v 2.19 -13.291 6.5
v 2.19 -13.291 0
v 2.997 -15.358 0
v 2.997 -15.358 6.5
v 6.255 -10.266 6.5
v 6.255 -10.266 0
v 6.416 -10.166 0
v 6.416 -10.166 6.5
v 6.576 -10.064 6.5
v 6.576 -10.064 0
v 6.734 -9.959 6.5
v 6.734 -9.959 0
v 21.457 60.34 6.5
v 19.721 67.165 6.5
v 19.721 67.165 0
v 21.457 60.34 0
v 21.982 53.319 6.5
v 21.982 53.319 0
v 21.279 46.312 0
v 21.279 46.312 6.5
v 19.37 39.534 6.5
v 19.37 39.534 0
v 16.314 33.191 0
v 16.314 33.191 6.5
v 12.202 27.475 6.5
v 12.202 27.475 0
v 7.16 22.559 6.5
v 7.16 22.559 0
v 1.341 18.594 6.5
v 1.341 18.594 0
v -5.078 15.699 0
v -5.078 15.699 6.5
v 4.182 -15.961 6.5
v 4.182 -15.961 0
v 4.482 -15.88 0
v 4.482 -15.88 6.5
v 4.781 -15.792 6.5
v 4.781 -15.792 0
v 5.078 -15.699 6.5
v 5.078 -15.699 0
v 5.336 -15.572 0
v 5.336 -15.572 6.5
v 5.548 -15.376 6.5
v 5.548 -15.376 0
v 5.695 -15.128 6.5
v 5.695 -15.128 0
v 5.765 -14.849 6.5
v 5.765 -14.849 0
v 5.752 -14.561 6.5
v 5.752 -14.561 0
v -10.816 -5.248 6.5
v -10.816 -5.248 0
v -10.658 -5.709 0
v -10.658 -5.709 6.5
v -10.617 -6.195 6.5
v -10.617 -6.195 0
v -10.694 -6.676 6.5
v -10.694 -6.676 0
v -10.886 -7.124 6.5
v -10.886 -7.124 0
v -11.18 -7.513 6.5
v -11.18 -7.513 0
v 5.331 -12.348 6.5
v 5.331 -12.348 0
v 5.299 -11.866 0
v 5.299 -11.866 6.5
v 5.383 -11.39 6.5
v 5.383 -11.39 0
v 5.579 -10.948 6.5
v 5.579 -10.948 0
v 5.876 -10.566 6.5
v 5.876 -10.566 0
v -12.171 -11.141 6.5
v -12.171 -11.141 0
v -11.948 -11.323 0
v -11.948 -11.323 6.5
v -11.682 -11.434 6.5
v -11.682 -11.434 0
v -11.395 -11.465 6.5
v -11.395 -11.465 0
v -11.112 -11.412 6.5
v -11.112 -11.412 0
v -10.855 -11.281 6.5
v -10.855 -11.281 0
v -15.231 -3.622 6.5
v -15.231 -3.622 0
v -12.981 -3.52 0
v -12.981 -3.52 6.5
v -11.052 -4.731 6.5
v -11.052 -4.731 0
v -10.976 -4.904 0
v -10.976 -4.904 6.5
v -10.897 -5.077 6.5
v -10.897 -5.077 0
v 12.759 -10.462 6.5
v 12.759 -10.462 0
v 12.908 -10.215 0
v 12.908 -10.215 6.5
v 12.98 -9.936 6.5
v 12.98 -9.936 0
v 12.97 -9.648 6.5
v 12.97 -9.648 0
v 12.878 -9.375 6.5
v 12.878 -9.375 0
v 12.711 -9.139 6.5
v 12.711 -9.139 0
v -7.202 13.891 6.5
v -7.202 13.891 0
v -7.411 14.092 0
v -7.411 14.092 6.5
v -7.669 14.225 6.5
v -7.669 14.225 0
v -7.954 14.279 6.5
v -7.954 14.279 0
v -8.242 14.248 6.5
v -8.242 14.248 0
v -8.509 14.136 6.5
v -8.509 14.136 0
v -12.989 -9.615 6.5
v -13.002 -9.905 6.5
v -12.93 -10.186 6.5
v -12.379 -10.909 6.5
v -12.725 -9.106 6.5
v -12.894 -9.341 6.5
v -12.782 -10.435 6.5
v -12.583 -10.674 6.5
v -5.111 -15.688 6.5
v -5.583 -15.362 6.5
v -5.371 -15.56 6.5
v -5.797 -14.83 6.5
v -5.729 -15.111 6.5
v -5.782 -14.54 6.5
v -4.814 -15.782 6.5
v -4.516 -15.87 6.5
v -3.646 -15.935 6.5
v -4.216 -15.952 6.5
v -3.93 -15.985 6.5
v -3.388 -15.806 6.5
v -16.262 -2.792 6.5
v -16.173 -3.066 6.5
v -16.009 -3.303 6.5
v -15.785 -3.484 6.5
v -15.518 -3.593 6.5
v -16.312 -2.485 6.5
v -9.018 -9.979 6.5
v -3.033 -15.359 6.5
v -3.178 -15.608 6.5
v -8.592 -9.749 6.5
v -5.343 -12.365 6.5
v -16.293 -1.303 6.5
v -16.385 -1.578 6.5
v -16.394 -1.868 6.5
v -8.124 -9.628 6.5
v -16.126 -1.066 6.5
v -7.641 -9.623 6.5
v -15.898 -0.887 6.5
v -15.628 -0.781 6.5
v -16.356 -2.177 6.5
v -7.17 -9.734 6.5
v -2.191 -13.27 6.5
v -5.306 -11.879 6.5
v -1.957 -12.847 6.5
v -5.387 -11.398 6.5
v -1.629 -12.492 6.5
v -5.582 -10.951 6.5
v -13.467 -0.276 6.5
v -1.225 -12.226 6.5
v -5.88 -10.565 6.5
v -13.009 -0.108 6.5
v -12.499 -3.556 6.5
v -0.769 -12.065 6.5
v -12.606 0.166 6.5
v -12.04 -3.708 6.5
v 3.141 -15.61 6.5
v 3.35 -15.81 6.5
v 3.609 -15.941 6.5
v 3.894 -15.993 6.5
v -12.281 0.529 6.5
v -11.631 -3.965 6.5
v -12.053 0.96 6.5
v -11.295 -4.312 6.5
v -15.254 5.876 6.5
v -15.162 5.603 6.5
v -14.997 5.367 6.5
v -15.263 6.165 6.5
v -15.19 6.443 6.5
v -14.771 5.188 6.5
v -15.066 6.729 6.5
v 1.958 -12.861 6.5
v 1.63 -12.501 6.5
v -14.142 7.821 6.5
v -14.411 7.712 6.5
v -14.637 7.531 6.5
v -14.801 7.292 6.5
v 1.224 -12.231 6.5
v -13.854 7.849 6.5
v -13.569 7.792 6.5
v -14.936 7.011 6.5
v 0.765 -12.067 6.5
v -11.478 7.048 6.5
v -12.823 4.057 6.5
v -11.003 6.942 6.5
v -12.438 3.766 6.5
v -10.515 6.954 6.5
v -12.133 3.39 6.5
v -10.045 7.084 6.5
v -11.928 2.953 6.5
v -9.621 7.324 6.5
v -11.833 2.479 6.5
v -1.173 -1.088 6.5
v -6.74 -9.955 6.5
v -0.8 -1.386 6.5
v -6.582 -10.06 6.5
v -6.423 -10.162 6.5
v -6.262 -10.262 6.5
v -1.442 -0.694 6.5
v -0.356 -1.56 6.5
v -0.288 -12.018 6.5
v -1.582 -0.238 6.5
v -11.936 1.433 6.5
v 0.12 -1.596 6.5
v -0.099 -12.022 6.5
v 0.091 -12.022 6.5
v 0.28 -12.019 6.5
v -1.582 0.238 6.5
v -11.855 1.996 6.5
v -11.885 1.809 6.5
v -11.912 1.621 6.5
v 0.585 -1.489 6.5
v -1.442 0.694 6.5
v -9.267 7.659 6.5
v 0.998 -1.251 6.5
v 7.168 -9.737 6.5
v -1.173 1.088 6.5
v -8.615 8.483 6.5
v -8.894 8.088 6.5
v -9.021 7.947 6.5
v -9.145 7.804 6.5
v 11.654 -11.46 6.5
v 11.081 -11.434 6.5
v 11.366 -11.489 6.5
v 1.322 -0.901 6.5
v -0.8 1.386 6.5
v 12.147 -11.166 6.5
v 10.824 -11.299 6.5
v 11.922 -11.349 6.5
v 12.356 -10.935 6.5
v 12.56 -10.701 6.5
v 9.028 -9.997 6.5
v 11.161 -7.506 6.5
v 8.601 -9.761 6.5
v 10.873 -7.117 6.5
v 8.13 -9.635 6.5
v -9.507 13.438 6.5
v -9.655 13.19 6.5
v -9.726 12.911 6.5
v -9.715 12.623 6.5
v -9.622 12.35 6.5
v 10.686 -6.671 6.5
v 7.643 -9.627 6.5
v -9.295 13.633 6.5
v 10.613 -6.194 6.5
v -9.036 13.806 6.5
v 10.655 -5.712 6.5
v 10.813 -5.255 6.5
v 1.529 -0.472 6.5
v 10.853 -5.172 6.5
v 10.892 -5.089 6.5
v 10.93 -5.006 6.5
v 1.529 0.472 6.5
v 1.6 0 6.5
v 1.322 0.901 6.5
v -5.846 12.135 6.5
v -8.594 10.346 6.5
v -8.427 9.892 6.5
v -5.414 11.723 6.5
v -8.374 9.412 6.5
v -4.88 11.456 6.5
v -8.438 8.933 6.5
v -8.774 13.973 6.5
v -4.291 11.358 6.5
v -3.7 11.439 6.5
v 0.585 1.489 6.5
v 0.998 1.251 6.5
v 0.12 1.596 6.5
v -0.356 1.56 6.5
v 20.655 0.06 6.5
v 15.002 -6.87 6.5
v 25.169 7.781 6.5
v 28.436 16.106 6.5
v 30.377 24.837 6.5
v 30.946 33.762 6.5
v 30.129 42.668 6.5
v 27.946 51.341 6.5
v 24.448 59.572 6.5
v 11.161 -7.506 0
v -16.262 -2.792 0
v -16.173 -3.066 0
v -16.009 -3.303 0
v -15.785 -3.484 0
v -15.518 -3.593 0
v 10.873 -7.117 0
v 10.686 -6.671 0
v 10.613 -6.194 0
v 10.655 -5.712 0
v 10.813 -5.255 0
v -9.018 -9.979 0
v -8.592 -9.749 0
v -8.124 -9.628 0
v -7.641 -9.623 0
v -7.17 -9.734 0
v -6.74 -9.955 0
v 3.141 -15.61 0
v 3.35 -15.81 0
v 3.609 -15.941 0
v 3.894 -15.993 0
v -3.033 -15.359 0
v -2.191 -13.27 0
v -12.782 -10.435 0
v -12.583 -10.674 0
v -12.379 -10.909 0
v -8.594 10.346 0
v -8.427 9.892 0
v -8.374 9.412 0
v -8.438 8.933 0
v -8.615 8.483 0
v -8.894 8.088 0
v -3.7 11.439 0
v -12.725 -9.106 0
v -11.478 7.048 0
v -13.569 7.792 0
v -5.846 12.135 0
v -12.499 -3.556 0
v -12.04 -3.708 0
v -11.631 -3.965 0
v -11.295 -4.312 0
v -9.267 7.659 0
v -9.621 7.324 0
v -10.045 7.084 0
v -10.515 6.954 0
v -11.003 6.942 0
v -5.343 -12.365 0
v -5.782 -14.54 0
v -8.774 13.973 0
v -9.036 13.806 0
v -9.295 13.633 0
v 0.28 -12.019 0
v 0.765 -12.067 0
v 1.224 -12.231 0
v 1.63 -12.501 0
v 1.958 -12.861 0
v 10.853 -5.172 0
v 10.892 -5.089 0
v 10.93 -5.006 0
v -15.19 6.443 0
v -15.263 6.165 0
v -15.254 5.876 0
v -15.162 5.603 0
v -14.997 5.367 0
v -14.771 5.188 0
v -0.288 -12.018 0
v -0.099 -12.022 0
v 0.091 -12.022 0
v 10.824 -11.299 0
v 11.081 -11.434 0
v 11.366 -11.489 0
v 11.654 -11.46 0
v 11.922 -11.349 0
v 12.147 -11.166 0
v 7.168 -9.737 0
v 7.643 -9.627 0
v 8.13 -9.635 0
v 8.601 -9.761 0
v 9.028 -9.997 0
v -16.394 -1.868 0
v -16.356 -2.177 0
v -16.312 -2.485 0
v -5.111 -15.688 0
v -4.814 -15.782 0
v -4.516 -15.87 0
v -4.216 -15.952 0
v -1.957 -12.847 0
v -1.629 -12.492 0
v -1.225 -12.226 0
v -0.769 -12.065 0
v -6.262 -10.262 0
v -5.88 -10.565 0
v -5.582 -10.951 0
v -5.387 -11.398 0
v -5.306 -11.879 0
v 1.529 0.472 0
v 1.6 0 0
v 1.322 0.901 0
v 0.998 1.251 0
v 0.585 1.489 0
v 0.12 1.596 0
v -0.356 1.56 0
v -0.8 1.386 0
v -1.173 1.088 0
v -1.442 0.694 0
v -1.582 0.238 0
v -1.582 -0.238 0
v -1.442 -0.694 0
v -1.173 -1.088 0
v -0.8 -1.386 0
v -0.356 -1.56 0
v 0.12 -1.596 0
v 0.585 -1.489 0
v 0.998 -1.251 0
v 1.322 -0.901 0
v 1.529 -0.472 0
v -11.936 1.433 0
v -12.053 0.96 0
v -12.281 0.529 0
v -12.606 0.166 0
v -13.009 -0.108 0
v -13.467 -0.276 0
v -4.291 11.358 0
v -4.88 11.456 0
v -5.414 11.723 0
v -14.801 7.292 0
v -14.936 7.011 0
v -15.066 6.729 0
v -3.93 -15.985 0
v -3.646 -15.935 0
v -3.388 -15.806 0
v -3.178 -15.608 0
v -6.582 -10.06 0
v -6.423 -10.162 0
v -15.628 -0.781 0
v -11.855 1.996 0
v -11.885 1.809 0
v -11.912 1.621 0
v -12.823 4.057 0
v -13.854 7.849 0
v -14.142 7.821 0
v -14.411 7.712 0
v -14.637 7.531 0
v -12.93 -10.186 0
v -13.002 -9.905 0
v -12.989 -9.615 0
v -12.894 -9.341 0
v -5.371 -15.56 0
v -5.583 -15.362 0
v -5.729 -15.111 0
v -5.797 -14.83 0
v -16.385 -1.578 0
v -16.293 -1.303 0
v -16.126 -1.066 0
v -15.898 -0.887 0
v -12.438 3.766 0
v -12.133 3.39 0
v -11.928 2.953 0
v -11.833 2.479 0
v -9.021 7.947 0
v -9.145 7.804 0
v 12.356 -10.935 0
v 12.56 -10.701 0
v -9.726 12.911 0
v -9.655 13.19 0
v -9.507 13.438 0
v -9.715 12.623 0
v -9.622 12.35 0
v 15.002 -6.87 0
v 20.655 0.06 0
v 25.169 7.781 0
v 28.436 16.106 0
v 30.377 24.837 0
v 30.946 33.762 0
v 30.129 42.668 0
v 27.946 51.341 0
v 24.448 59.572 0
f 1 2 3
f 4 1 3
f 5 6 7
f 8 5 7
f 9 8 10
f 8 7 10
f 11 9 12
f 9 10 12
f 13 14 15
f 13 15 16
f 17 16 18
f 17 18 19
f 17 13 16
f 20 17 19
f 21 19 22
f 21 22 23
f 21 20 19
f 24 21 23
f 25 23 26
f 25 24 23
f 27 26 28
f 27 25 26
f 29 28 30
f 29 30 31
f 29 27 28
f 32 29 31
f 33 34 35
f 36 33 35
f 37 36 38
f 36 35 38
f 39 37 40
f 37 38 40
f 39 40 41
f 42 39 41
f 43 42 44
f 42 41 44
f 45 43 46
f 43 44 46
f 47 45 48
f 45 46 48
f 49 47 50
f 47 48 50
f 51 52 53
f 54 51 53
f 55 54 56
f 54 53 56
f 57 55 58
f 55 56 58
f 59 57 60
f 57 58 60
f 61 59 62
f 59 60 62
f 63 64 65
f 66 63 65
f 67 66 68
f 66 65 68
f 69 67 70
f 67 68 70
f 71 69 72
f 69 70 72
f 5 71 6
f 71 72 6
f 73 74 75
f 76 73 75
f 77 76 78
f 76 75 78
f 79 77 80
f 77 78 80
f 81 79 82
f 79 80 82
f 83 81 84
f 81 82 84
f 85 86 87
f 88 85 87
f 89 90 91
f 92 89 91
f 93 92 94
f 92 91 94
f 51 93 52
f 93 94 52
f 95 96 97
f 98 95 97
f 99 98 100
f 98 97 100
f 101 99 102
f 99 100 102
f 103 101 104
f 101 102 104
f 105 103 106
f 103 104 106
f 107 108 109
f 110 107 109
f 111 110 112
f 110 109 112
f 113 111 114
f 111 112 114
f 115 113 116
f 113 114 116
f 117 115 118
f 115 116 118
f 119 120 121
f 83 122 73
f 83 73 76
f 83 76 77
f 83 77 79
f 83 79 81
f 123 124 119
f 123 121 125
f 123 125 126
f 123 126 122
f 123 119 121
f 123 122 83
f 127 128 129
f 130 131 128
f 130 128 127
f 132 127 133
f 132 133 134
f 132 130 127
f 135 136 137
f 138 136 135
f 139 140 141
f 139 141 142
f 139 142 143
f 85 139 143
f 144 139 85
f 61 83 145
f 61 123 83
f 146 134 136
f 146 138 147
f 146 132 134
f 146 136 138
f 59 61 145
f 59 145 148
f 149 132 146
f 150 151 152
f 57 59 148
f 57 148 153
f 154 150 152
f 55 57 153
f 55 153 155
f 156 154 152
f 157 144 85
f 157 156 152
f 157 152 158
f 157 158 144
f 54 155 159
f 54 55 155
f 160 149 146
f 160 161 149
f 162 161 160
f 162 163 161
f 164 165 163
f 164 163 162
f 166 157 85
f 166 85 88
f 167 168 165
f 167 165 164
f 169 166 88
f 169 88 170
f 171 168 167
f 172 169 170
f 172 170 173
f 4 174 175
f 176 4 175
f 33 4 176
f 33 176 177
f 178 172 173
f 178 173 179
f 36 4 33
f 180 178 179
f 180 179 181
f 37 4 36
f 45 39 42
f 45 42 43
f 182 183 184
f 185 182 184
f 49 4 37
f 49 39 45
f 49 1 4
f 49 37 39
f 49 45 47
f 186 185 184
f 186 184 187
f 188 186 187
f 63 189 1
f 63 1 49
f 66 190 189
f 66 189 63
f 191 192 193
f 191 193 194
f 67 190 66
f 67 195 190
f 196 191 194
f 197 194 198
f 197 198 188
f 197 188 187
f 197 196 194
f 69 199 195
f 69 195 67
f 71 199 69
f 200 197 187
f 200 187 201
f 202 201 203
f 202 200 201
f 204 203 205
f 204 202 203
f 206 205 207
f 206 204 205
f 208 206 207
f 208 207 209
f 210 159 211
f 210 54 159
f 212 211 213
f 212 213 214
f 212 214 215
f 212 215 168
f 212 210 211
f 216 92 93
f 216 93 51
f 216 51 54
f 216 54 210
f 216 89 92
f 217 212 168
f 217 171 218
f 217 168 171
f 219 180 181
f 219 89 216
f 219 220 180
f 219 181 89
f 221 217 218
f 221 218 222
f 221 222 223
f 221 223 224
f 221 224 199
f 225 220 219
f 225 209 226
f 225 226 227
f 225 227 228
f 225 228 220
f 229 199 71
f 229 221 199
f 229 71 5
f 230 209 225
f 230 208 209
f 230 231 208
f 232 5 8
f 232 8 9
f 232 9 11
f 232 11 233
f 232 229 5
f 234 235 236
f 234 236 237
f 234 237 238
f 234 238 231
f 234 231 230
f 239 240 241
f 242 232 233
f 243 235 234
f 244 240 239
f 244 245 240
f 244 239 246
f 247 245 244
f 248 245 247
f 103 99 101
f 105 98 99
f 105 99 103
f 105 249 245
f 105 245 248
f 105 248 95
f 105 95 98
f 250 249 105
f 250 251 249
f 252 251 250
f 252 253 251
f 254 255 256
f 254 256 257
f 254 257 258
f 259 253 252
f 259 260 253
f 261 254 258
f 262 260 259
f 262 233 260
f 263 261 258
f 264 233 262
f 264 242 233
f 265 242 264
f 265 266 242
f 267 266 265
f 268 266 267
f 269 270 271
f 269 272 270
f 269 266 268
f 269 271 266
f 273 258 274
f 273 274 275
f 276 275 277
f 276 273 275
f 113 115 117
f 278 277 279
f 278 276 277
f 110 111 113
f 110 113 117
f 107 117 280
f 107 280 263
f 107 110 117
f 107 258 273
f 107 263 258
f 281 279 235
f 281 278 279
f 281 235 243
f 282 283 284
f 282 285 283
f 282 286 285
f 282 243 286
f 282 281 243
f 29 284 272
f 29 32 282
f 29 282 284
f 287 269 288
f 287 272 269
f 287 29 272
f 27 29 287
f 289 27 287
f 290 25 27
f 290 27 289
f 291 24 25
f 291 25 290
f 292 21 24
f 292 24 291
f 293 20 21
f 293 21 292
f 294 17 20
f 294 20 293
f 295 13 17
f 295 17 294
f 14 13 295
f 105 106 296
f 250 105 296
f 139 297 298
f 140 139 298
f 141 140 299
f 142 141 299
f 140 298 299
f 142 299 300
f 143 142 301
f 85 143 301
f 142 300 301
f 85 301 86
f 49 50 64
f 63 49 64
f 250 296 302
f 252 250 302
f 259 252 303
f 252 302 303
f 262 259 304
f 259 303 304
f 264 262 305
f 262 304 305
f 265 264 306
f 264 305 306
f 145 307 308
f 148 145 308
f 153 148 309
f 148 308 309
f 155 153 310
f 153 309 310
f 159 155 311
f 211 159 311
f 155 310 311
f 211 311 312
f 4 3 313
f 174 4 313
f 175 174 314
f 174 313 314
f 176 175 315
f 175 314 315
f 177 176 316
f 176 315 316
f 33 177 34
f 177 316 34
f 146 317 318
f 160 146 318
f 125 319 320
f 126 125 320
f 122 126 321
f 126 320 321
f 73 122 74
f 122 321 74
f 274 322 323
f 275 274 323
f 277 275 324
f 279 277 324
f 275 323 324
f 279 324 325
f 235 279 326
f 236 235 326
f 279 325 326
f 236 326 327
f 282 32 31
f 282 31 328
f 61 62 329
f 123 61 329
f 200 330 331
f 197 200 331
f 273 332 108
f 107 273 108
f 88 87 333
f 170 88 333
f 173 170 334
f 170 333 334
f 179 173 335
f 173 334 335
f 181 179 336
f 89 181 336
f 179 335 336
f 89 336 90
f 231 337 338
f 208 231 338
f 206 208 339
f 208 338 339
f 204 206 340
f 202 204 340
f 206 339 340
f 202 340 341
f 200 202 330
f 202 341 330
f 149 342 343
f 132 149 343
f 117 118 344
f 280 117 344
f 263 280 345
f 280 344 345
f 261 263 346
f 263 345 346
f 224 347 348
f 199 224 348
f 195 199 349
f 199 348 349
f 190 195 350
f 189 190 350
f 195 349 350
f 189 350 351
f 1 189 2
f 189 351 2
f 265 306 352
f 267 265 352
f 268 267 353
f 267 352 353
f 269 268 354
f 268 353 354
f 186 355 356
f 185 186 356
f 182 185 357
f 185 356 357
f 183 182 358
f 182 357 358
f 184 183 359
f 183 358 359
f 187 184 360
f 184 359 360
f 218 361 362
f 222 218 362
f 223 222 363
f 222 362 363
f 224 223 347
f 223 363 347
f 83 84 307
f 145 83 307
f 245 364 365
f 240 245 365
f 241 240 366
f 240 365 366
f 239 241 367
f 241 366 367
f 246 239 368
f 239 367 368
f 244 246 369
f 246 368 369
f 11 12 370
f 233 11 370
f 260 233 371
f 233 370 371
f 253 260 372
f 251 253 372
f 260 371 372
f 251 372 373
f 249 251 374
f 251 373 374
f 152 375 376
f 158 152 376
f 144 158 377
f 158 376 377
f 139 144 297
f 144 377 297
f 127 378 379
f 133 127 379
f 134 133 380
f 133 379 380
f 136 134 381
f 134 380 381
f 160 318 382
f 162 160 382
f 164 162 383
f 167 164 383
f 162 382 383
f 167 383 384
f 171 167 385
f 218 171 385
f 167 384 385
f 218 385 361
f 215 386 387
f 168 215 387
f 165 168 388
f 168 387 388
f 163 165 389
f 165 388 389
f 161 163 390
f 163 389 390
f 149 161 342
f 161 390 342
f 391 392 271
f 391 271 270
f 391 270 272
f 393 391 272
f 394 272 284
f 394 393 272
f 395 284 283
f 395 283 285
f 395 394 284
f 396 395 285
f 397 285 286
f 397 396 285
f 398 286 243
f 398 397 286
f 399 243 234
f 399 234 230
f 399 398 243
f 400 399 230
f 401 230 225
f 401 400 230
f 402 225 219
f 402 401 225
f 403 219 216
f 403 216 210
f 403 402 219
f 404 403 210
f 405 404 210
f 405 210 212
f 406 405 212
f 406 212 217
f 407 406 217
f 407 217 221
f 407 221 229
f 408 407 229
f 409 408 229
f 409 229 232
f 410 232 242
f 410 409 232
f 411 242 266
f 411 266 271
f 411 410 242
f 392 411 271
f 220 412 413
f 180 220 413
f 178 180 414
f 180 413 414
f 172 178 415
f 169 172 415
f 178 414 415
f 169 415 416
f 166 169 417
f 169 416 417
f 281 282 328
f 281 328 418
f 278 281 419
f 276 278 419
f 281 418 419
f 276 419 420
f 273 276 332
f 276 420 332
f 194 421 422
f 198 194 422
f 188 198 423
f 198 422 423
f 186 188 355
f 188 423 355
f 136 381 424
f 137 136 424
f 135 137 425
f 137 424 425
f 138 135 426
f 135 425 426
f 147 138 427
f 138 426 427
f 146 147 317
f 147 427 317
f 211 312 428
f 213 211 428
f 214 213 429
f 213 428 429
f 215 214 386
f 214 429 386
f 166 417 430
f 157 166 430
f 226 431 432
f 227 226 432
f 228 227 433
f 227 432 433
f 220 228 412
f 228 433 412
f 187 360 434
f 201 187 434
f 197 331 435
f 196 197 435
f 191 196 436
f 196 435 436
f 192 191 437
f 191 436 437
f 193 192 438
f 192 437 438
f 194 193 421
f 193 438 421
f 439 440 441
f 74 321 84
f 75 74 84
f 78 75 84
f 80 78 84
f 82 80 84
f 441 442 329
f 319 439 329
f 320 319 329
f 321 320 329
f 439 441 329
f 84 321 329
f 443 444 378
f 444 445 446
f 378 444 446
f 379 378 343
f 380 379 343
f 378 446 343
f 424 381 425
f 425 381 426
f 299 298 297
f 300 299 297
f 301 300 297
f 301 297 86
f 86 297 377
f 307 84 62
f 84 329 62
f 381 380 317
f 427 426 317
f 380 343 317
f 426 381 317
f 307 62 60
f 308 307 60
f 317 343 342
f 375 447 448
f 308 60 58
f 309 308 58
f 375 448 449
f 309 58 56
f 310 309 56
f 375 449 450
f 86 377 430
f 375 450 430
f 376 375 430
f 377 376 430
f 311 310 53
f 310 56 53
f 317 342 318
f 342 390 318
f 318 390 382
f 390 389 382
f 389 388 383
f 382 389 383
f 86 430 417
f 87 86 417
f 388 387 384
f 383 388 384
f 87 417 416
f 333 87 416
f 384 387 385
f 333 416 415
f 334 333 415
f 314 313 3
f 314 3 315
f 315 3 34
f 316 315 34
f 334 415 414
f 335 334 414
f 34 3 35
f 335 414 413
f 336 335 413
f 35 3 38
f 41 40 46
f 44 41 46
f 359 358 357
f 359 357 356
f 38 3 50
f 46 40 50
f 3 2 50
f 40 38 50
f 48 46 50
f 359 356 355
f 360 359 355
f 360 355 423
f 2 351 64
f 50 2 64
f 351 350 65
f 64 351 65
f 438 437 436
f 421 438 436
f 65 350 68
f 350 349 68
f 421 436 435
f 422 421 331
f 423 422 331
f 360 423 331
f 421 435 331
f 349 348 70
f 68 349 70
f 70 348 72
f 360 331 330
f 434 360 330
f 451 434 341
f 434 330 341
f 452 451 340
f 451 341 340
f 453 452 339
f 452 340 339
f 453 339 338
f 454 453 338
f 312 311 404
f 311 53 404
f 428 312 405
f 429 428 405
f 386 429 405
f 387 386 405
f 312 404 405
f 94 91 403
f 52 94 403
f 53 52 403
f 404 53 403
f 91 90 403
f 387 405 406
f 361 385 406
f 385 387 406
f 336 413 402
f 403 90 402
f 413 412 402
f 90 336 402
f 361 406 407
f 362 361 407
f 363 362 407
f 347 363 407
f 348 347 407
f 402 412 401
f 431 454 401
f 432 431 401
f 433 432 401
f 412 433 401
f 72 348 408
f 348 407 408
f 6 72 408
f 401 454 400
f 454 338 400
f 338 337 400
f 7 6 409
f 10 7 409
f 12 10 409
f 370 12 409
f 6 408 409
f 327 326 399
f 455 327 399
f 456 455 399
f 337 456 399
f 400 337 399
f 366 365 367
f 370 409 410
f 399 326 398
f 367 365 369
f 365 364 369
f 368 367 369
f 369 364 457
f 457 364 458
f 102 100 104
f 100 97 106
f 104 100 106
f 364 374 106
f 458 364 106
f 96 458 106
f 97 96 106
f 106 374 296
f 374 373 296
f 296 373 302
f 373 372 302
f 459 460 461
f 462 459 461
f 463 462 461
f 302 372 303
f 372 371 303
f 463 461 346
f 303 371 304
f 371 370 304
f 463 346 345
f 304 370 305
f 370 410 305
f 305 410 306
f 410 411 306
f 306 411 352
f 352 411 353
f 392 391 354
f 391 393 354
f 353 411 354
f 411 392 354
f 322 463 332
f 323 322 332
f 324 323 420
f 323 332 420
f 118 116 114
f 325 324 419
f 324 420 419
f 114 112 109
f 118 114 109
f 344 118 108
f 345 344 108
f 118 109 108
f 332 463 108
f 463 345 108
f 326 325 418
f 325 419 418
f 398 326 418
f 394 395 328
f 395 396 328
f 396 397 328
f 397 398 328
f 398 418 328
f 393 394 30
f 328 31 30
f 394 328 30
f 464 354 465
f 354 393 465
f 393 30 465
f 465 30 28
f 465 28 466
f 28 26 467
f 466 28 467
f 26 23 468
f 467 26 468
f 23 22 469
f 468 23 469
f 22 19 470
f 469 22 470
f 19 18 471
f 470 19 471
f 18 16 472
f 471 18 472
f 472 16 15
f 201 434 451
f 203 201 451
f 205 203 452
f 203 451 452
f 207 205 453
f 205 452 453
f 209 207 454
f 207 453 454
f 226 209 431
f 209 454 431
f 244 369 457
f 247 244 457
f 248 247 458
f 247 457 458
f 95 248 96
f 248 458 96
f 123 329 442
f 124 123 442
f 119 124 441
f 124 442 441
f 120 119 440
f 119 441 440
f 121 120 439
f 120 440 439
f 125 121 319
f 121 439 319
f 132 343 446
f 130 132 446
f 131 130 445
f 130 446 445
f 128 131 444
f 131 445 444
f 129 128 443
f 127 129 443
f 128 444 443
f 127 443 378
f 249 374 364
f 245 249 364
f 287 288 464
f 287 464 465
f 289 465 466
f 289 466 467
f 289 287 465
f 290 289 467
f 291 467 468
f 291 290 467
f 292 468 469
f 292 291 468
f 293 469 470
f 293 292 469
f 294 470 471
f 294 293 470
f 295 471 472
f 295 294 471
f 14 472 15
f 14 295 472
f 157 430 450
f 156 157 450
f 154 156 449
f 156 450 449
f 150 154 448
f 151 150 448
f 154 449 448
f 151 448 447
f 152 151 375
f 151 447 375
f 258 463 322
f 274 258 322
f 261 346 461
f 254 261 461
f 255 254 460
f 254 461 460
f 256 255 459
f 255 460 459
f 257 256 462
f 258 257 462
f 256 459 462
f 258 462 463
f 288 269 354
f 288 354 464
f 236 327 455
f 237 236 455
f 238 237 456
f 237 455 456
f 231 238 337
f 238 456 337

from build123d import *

# Parameters (mm, degrees)
ESBO_O1_R                = 1.6
RESSALTO_EXTRUS_O1_DEPTH = 6.5
RESSALTO_EXTRUS_O2_DEPTH = 6.5


with BuildPart() as part:
    # Esboço1 → Ressalto-extrusão1 (new body)
    with BuildSketch(Plane.XY):
        with BuildLine():
            Line((7.237292739, 13.882644275), (5.840999253, 12.115479156))
            ThreePointArc((5.840999253, 12.115479156), (4.855639954, 11.442537909), (3.66244261, 11.450473127))
            ThreePointArc((3.66244261, 11.450473127), (3.390740604, 11.533850132), (3.117143568, 11.610781054))
            ThreePointArc((3.117143568, 11.610781054), (2.102970634, 12.257593135), (1.64323621, 13.369149192))
            Line((1.64323621, 13.369149192), (1.451023847, 15.579942687))
            ThreePointArc((1.451023847, 15.579942687), (1.141313879, 16.220426504), (0.484122849, 16.4928962))
            ThreePointArc((0.484122849, 16.4928962), (0.017522037, 16.499990696), (-0.449092791, 16.493887221))
            ThreePointArc((-0.449092791, 16.493887221), (-1.103704511, 16.225768855), (-1.417126065, 15.591599404))
            Line((-1.417126065, 15.591599404), (-1.636361298, 13.350072253))
            ThreePointArc((-1.636361298, 13.350072253), (-2.101478783, 12.251232594), (-3.109550367, 11.612816937))
            ThreePointArc((-3.109550367, 11.612816937), (-3.383197652, 11.536064942), (-3.654954122, 11.452865627))
            ThreePointArc((-3.654954122, 11.452865627), (-4.857823698, 11.448695291), (-5.845529481, 12.135244556))
            Line((-5.845529481, 12.135244556), (-7.202474013, 13.891164545))
            ThreePointArc((-7.202474013, 13.891164545), (-7.809290312, 14.262531969), (-8.509462826, 14.136443768))
            ThreePointArc((-8.509462826, 14.136443768), (-8.905827982, 13.890148593), (-9.295069567, 13.632743002))
            ThreePointArc((-9.295069567, 13.632743002), (-9.700808257, 13.053277663), (-9.621617356, 12.350331887))
            Line((-9.621617356, 12.350331887), (-8.594188699, 10.346111737))
            ThreePointArc((-8.594188699, 10.346111737), (-8.391392855, 9.170247495), (-8.894283074, 8.088173422))
            ThreePointArc((-8.894283074, 8.088173422), (-9.082994557, 7.875660644), (-9.266629702, 7.658746286))
            ThreePointArc((-9.266629702, 7.658746286), (-10.276293328, 7.004917585), (-11.478380864, 7.048485517))
            Line((-11.478380864, 7.048485517), (-13.569237263, 7.792039811))
            ThreePointArc((-13.569237263, 7.792039811), (-14.280500006, 7.776384308), (-14.80135418, 7.291770323))
            ThreePointArc((-14.80135418, 7.291770323), (-15.001640543, 6.870282455), (-15.189927432, 6.443299203))
            ThreePointArc((-15.189927432, 6.443299203), (-15.217973923, 5.736463043), (-14.771313119, 5.187921259))
            Line((-14.771313119, 5.187921259), (-12.823421912, 4.057333846))
            ThreePointArc((-12.823421912, 4.057333846), (-12.017098986, 3.177773609), (-11.855143748, 1.995591994))
            ThreePointArc((-11.855143748, 1.995591994), (-11.899004868, 1.714789737), (-11.936215827, 1.433029113))
            ThreePointArc((-11.936215827, 1.433029113), (-12.432112436, 0.33712804), (-13.466927425, -0.276117871))
            Line((-13.466927425, -0.276117871), (-15.627863558, -0.781002507))
            ThreePointArc((-15.627863558, -0.781002507), (-16.21775185, -1.178710425), (-16.393920163, -1.867988679))
            ThreePointArc((-16.393920163, -1.867988679), (-16.334538228, -2.330849819), (-16.262090664, -2.791846566))
            ThreePointArc((-16.262090664, -2.791846566), (-15.903540395, -3.401638061), (-15.231221337, -3.621617713))
            Line((-15.231221337, -3.621617713), (-12.981309273, -3.519618873))
            ThreePointArc((-12.981309273, -3.519618873), (-11.827461098, -3.823620944), (-11.052080047, -4.730575792))
            ThreePointArc((-11.052080047, -4.730575792), (-10.937165208, -4.990514794), (-10.816137764, -5.247664678))
            ThreePointArc((-10.816137764, -5.247664678), (-10.640823687, -6.437697275), (-11.179819681, -7.513055786))
            Line((-11.179819681, -7.513055786), (-12.724753595, -9.106082048))
            ThreePointArc((-12.724753595, -9.106082048), (-13.005982071, -9.759572927), (-12.781532328, -10.434674473))
            ThreePointArc((-12.781532328, -10.434674473), (-12.48133544, -10.791953745), (-12.171155012, -11.140600777))
            ThreePointArc((-12.171155012, -11.140600777), (-11.53984516, -11.459743115), (-10.855324398, -11.28131865))
            Line((-10.855324398, -11.28131865), (-9.017722662, -9.979117468))
            ThreePointArc((-9.017722662, -9.979117468), (-7.88268788, -9.611042864), (-6.740059022, -9.954819189))
            ThreePointArc((-6.740059022, -9.954819189), (-6.502852873, -10.11136614), (-6.262012384, -10.262262012))
            ThreePointArc((-6.262012384, -10.262262012), (-5.471148601, -11.168599193), (-5.343198182, -12.364651574))
            Line((-5.343198182, -12.364651574), (-5.781624274, -14.540044879))
            ThreePointArc((-5.781624274, -14.540044879), (-5.664904879, -15.241839982), (-5.111098288, -15.68842485))
            ThreePointArc((-5.111098288, -15.68842485), (-4.665396838, -15.826688609), (-4.215963642, -15.952292956))
            ThreePointArc((-4.215963642, -15.952292956), (-3.512330623, -15.879460702), (-3.032938663, -15.359280625))
            Line((-3.032938663, -15.359280625), (-2.191072822, -13.270316777))
            ThreePointArc((-2.191072822, -13.270316777), (-1.435216957, -12.347026583), (-0.28811688, -12.018477831))
            ThreePointArc((-0.28811688, -12.018477831), (-0.003930697, -12.02193018), (0.280257682, -12.018663667))
            ThreePointArc((0.280257682, -12.018663667), (1.435577508, -12.35354978), (2.189850988, -13.290557851))
            Line((2.189850988, -13.290557851), (2.997129903, -15.357646195))
            ThreePointArc((2.997129903, -15.357646195), (3.474739585, -15.884930537), (4.182073344, -15.961211187))
            ThreePointArc((4.182073344, -15.961211187), (4.631772295, -15.836561666), (5.077766396, -15.699244836))
            ThreePointArc((5.077766396, -15.699244836), (5.630324069, -15.257561714), (5.752383667, -14.560779526))
            Line((5.752383667, -14.560779526), (5.331227158, -12.348284272))
            ThreePointArc((5.331227158, -12.348284272), (5.46792521, -11.162916602), (6.255300336, -10.26635468))
            ThreePointArc((6.255300336, -10.26635468), (6.496239447, -10.11561633), (6.733547915, -9.959224527))
            ThreePointArc((6.733547915, -9.959224527), (7.886517902, -9.616335598), (9.027637941, -9.996805918))
            Line((9.027637941, -9.996805918), (10.824316513, -11.299303357))
            ThreePointArc((10.824316513, -11.299303357), (11.511178782, -11.484667883), (12.147466239, -11.166425748))
            ThreePointArc((12.147466239, -11.166425748), (12.458386452, -10.81843829), (12.759341481, -10.461797406))
            ThreePointArc((12.759341481, -10.461797406), (12.985390652, -9.791494687), (12.711364828, -9.139333809))
            Line((12.711364828, -9.139333809), (11.160900184, -7.505758759))
            ThreePointArc((11.160900184, -7.505758759), (10.635039757, -6.434659473), (10.812703893, -5.254736456))
            ThreePointArc((10.812703893, -5.254736456), (10.933899467, -4.99766577), (11.048984261, -4.737801968))
            ThreePointArc((11.048984261, -4.737801968), (11.833544585, -3.826002809), (12.999213634, -3.529138739))
            Line((12.999213634, -3.529138739), (15.21485911, -3.65351154))
            ThreePointArc((15.21485911, -3.65351154), (15.89290005, -3.438104324), (16.256124433, -2.826379032))
            ThreePointArc((16.256124433, -2.826379032), (16.329550936, -2.365537195), (16.389915799, -1.902803219))
            ThreePointArc((16.389915799, -1.902803219), (16.217687452, -1.21669728), (15.63457747, -0.816214183))
            Line((15.63457747, -0.816214183), (13.44706626, -0.280207874))
            ThreePointArc((13.44706626, -0.280207874), (12.425604324, 0.336556574), (11.937150363, 1.425223464))
            ThreePointArc((11.937150363, 1.425223464), (11.900123661, 1.707008361), (11.856446173, 1.987839239))
            ThreePointArc((11.856446173, 1.987839239), (12.023504475, 3.179058838), (12.843630847, 4.059005053))
            Line((12.843630847, 4.059005053), (14.774791444, 5.152244377))
            ThreePointArc((14.774791444, 5.152244377), (15.228737846, 5.700033066), (15.203577979, 6.411023056))
            ThreePointArc((15.203577979, 6.411023056), (15.016198378, 6.838405244), (14.816807657, 7.260317546))
            ThreePointArc((14.816807657, 7.260317546), (14.300983076, 7.744392916), (13.593922234, 7.766047679))
            Line((13.593922234, 7.766047679), (11.463883812, 7.034307031))
            ThreePointArc((11.463883812, 7.034307031), (10.271127314, 7.000918286), (9.271635936, 7.652685004))
            ThreePointArc((9.271635936, 7.652685004), (9.088142675, 7.869719398), (8.899570199, 8.082355534))
            ThreePointArc((8.899570199, 8.082355534), (8.396086648, 9.174791766), (8.610286014, 10.358443421))
            Line((8.610286014, 10.358443421), (9.643831887, 12.322199108))
            ThreePointArc((9.643831887, 12.322199108), (9.729558977, 13.028450232), (9.324002941, 13.612970622))
            ThreePointArc((9.324002941, 13.612970622), (8.935308934, 13.871202336), (8.539467774, 14.118338788))
            ThreePointArc((8.539467774, 14.118338788), (7.843817619, 14.246693081), (7.237292739, 13.882644275))
        make_face()
        Circle(ESBO_O1_R, mode=Mode.SUBTRACT)
    extrude(amount=RESSALTO_EXTRUS_O1_DEPTH)

    # Esboço6 → Ressalto-extrusão2 (add)
    with BuildSketch(Plane.XY.offset(6.5)):
        with BuildLine():
            ThreePointArc((19.721119128, 67.164555089), (17.980474936, 36.295868824), (-5.07780376, 15.699232751))
            Line((-5.07780376, 15.699232751), (-3.385202507, 10.466155167))
            ThreePointArc((-3.385202507, 10.466155167), (6.471582976, 8.894864461), (11, 0))
            ThreePointArc((11, 0), (10.747375274, -2.343912268), (10.001104596, -4.580164501))
            Line((10.001104596, -4.580164501), (15.001656894, -6.870246751))
            ThreePointArc((15.001656894, -6.870246751), (30.834620096, 29.288282282), (19.721119128, 67.164555089))
        make_face()
    extrude(amount=-RESSALTO_EXTRUS_O2_DEPTH)


solid = part.part
